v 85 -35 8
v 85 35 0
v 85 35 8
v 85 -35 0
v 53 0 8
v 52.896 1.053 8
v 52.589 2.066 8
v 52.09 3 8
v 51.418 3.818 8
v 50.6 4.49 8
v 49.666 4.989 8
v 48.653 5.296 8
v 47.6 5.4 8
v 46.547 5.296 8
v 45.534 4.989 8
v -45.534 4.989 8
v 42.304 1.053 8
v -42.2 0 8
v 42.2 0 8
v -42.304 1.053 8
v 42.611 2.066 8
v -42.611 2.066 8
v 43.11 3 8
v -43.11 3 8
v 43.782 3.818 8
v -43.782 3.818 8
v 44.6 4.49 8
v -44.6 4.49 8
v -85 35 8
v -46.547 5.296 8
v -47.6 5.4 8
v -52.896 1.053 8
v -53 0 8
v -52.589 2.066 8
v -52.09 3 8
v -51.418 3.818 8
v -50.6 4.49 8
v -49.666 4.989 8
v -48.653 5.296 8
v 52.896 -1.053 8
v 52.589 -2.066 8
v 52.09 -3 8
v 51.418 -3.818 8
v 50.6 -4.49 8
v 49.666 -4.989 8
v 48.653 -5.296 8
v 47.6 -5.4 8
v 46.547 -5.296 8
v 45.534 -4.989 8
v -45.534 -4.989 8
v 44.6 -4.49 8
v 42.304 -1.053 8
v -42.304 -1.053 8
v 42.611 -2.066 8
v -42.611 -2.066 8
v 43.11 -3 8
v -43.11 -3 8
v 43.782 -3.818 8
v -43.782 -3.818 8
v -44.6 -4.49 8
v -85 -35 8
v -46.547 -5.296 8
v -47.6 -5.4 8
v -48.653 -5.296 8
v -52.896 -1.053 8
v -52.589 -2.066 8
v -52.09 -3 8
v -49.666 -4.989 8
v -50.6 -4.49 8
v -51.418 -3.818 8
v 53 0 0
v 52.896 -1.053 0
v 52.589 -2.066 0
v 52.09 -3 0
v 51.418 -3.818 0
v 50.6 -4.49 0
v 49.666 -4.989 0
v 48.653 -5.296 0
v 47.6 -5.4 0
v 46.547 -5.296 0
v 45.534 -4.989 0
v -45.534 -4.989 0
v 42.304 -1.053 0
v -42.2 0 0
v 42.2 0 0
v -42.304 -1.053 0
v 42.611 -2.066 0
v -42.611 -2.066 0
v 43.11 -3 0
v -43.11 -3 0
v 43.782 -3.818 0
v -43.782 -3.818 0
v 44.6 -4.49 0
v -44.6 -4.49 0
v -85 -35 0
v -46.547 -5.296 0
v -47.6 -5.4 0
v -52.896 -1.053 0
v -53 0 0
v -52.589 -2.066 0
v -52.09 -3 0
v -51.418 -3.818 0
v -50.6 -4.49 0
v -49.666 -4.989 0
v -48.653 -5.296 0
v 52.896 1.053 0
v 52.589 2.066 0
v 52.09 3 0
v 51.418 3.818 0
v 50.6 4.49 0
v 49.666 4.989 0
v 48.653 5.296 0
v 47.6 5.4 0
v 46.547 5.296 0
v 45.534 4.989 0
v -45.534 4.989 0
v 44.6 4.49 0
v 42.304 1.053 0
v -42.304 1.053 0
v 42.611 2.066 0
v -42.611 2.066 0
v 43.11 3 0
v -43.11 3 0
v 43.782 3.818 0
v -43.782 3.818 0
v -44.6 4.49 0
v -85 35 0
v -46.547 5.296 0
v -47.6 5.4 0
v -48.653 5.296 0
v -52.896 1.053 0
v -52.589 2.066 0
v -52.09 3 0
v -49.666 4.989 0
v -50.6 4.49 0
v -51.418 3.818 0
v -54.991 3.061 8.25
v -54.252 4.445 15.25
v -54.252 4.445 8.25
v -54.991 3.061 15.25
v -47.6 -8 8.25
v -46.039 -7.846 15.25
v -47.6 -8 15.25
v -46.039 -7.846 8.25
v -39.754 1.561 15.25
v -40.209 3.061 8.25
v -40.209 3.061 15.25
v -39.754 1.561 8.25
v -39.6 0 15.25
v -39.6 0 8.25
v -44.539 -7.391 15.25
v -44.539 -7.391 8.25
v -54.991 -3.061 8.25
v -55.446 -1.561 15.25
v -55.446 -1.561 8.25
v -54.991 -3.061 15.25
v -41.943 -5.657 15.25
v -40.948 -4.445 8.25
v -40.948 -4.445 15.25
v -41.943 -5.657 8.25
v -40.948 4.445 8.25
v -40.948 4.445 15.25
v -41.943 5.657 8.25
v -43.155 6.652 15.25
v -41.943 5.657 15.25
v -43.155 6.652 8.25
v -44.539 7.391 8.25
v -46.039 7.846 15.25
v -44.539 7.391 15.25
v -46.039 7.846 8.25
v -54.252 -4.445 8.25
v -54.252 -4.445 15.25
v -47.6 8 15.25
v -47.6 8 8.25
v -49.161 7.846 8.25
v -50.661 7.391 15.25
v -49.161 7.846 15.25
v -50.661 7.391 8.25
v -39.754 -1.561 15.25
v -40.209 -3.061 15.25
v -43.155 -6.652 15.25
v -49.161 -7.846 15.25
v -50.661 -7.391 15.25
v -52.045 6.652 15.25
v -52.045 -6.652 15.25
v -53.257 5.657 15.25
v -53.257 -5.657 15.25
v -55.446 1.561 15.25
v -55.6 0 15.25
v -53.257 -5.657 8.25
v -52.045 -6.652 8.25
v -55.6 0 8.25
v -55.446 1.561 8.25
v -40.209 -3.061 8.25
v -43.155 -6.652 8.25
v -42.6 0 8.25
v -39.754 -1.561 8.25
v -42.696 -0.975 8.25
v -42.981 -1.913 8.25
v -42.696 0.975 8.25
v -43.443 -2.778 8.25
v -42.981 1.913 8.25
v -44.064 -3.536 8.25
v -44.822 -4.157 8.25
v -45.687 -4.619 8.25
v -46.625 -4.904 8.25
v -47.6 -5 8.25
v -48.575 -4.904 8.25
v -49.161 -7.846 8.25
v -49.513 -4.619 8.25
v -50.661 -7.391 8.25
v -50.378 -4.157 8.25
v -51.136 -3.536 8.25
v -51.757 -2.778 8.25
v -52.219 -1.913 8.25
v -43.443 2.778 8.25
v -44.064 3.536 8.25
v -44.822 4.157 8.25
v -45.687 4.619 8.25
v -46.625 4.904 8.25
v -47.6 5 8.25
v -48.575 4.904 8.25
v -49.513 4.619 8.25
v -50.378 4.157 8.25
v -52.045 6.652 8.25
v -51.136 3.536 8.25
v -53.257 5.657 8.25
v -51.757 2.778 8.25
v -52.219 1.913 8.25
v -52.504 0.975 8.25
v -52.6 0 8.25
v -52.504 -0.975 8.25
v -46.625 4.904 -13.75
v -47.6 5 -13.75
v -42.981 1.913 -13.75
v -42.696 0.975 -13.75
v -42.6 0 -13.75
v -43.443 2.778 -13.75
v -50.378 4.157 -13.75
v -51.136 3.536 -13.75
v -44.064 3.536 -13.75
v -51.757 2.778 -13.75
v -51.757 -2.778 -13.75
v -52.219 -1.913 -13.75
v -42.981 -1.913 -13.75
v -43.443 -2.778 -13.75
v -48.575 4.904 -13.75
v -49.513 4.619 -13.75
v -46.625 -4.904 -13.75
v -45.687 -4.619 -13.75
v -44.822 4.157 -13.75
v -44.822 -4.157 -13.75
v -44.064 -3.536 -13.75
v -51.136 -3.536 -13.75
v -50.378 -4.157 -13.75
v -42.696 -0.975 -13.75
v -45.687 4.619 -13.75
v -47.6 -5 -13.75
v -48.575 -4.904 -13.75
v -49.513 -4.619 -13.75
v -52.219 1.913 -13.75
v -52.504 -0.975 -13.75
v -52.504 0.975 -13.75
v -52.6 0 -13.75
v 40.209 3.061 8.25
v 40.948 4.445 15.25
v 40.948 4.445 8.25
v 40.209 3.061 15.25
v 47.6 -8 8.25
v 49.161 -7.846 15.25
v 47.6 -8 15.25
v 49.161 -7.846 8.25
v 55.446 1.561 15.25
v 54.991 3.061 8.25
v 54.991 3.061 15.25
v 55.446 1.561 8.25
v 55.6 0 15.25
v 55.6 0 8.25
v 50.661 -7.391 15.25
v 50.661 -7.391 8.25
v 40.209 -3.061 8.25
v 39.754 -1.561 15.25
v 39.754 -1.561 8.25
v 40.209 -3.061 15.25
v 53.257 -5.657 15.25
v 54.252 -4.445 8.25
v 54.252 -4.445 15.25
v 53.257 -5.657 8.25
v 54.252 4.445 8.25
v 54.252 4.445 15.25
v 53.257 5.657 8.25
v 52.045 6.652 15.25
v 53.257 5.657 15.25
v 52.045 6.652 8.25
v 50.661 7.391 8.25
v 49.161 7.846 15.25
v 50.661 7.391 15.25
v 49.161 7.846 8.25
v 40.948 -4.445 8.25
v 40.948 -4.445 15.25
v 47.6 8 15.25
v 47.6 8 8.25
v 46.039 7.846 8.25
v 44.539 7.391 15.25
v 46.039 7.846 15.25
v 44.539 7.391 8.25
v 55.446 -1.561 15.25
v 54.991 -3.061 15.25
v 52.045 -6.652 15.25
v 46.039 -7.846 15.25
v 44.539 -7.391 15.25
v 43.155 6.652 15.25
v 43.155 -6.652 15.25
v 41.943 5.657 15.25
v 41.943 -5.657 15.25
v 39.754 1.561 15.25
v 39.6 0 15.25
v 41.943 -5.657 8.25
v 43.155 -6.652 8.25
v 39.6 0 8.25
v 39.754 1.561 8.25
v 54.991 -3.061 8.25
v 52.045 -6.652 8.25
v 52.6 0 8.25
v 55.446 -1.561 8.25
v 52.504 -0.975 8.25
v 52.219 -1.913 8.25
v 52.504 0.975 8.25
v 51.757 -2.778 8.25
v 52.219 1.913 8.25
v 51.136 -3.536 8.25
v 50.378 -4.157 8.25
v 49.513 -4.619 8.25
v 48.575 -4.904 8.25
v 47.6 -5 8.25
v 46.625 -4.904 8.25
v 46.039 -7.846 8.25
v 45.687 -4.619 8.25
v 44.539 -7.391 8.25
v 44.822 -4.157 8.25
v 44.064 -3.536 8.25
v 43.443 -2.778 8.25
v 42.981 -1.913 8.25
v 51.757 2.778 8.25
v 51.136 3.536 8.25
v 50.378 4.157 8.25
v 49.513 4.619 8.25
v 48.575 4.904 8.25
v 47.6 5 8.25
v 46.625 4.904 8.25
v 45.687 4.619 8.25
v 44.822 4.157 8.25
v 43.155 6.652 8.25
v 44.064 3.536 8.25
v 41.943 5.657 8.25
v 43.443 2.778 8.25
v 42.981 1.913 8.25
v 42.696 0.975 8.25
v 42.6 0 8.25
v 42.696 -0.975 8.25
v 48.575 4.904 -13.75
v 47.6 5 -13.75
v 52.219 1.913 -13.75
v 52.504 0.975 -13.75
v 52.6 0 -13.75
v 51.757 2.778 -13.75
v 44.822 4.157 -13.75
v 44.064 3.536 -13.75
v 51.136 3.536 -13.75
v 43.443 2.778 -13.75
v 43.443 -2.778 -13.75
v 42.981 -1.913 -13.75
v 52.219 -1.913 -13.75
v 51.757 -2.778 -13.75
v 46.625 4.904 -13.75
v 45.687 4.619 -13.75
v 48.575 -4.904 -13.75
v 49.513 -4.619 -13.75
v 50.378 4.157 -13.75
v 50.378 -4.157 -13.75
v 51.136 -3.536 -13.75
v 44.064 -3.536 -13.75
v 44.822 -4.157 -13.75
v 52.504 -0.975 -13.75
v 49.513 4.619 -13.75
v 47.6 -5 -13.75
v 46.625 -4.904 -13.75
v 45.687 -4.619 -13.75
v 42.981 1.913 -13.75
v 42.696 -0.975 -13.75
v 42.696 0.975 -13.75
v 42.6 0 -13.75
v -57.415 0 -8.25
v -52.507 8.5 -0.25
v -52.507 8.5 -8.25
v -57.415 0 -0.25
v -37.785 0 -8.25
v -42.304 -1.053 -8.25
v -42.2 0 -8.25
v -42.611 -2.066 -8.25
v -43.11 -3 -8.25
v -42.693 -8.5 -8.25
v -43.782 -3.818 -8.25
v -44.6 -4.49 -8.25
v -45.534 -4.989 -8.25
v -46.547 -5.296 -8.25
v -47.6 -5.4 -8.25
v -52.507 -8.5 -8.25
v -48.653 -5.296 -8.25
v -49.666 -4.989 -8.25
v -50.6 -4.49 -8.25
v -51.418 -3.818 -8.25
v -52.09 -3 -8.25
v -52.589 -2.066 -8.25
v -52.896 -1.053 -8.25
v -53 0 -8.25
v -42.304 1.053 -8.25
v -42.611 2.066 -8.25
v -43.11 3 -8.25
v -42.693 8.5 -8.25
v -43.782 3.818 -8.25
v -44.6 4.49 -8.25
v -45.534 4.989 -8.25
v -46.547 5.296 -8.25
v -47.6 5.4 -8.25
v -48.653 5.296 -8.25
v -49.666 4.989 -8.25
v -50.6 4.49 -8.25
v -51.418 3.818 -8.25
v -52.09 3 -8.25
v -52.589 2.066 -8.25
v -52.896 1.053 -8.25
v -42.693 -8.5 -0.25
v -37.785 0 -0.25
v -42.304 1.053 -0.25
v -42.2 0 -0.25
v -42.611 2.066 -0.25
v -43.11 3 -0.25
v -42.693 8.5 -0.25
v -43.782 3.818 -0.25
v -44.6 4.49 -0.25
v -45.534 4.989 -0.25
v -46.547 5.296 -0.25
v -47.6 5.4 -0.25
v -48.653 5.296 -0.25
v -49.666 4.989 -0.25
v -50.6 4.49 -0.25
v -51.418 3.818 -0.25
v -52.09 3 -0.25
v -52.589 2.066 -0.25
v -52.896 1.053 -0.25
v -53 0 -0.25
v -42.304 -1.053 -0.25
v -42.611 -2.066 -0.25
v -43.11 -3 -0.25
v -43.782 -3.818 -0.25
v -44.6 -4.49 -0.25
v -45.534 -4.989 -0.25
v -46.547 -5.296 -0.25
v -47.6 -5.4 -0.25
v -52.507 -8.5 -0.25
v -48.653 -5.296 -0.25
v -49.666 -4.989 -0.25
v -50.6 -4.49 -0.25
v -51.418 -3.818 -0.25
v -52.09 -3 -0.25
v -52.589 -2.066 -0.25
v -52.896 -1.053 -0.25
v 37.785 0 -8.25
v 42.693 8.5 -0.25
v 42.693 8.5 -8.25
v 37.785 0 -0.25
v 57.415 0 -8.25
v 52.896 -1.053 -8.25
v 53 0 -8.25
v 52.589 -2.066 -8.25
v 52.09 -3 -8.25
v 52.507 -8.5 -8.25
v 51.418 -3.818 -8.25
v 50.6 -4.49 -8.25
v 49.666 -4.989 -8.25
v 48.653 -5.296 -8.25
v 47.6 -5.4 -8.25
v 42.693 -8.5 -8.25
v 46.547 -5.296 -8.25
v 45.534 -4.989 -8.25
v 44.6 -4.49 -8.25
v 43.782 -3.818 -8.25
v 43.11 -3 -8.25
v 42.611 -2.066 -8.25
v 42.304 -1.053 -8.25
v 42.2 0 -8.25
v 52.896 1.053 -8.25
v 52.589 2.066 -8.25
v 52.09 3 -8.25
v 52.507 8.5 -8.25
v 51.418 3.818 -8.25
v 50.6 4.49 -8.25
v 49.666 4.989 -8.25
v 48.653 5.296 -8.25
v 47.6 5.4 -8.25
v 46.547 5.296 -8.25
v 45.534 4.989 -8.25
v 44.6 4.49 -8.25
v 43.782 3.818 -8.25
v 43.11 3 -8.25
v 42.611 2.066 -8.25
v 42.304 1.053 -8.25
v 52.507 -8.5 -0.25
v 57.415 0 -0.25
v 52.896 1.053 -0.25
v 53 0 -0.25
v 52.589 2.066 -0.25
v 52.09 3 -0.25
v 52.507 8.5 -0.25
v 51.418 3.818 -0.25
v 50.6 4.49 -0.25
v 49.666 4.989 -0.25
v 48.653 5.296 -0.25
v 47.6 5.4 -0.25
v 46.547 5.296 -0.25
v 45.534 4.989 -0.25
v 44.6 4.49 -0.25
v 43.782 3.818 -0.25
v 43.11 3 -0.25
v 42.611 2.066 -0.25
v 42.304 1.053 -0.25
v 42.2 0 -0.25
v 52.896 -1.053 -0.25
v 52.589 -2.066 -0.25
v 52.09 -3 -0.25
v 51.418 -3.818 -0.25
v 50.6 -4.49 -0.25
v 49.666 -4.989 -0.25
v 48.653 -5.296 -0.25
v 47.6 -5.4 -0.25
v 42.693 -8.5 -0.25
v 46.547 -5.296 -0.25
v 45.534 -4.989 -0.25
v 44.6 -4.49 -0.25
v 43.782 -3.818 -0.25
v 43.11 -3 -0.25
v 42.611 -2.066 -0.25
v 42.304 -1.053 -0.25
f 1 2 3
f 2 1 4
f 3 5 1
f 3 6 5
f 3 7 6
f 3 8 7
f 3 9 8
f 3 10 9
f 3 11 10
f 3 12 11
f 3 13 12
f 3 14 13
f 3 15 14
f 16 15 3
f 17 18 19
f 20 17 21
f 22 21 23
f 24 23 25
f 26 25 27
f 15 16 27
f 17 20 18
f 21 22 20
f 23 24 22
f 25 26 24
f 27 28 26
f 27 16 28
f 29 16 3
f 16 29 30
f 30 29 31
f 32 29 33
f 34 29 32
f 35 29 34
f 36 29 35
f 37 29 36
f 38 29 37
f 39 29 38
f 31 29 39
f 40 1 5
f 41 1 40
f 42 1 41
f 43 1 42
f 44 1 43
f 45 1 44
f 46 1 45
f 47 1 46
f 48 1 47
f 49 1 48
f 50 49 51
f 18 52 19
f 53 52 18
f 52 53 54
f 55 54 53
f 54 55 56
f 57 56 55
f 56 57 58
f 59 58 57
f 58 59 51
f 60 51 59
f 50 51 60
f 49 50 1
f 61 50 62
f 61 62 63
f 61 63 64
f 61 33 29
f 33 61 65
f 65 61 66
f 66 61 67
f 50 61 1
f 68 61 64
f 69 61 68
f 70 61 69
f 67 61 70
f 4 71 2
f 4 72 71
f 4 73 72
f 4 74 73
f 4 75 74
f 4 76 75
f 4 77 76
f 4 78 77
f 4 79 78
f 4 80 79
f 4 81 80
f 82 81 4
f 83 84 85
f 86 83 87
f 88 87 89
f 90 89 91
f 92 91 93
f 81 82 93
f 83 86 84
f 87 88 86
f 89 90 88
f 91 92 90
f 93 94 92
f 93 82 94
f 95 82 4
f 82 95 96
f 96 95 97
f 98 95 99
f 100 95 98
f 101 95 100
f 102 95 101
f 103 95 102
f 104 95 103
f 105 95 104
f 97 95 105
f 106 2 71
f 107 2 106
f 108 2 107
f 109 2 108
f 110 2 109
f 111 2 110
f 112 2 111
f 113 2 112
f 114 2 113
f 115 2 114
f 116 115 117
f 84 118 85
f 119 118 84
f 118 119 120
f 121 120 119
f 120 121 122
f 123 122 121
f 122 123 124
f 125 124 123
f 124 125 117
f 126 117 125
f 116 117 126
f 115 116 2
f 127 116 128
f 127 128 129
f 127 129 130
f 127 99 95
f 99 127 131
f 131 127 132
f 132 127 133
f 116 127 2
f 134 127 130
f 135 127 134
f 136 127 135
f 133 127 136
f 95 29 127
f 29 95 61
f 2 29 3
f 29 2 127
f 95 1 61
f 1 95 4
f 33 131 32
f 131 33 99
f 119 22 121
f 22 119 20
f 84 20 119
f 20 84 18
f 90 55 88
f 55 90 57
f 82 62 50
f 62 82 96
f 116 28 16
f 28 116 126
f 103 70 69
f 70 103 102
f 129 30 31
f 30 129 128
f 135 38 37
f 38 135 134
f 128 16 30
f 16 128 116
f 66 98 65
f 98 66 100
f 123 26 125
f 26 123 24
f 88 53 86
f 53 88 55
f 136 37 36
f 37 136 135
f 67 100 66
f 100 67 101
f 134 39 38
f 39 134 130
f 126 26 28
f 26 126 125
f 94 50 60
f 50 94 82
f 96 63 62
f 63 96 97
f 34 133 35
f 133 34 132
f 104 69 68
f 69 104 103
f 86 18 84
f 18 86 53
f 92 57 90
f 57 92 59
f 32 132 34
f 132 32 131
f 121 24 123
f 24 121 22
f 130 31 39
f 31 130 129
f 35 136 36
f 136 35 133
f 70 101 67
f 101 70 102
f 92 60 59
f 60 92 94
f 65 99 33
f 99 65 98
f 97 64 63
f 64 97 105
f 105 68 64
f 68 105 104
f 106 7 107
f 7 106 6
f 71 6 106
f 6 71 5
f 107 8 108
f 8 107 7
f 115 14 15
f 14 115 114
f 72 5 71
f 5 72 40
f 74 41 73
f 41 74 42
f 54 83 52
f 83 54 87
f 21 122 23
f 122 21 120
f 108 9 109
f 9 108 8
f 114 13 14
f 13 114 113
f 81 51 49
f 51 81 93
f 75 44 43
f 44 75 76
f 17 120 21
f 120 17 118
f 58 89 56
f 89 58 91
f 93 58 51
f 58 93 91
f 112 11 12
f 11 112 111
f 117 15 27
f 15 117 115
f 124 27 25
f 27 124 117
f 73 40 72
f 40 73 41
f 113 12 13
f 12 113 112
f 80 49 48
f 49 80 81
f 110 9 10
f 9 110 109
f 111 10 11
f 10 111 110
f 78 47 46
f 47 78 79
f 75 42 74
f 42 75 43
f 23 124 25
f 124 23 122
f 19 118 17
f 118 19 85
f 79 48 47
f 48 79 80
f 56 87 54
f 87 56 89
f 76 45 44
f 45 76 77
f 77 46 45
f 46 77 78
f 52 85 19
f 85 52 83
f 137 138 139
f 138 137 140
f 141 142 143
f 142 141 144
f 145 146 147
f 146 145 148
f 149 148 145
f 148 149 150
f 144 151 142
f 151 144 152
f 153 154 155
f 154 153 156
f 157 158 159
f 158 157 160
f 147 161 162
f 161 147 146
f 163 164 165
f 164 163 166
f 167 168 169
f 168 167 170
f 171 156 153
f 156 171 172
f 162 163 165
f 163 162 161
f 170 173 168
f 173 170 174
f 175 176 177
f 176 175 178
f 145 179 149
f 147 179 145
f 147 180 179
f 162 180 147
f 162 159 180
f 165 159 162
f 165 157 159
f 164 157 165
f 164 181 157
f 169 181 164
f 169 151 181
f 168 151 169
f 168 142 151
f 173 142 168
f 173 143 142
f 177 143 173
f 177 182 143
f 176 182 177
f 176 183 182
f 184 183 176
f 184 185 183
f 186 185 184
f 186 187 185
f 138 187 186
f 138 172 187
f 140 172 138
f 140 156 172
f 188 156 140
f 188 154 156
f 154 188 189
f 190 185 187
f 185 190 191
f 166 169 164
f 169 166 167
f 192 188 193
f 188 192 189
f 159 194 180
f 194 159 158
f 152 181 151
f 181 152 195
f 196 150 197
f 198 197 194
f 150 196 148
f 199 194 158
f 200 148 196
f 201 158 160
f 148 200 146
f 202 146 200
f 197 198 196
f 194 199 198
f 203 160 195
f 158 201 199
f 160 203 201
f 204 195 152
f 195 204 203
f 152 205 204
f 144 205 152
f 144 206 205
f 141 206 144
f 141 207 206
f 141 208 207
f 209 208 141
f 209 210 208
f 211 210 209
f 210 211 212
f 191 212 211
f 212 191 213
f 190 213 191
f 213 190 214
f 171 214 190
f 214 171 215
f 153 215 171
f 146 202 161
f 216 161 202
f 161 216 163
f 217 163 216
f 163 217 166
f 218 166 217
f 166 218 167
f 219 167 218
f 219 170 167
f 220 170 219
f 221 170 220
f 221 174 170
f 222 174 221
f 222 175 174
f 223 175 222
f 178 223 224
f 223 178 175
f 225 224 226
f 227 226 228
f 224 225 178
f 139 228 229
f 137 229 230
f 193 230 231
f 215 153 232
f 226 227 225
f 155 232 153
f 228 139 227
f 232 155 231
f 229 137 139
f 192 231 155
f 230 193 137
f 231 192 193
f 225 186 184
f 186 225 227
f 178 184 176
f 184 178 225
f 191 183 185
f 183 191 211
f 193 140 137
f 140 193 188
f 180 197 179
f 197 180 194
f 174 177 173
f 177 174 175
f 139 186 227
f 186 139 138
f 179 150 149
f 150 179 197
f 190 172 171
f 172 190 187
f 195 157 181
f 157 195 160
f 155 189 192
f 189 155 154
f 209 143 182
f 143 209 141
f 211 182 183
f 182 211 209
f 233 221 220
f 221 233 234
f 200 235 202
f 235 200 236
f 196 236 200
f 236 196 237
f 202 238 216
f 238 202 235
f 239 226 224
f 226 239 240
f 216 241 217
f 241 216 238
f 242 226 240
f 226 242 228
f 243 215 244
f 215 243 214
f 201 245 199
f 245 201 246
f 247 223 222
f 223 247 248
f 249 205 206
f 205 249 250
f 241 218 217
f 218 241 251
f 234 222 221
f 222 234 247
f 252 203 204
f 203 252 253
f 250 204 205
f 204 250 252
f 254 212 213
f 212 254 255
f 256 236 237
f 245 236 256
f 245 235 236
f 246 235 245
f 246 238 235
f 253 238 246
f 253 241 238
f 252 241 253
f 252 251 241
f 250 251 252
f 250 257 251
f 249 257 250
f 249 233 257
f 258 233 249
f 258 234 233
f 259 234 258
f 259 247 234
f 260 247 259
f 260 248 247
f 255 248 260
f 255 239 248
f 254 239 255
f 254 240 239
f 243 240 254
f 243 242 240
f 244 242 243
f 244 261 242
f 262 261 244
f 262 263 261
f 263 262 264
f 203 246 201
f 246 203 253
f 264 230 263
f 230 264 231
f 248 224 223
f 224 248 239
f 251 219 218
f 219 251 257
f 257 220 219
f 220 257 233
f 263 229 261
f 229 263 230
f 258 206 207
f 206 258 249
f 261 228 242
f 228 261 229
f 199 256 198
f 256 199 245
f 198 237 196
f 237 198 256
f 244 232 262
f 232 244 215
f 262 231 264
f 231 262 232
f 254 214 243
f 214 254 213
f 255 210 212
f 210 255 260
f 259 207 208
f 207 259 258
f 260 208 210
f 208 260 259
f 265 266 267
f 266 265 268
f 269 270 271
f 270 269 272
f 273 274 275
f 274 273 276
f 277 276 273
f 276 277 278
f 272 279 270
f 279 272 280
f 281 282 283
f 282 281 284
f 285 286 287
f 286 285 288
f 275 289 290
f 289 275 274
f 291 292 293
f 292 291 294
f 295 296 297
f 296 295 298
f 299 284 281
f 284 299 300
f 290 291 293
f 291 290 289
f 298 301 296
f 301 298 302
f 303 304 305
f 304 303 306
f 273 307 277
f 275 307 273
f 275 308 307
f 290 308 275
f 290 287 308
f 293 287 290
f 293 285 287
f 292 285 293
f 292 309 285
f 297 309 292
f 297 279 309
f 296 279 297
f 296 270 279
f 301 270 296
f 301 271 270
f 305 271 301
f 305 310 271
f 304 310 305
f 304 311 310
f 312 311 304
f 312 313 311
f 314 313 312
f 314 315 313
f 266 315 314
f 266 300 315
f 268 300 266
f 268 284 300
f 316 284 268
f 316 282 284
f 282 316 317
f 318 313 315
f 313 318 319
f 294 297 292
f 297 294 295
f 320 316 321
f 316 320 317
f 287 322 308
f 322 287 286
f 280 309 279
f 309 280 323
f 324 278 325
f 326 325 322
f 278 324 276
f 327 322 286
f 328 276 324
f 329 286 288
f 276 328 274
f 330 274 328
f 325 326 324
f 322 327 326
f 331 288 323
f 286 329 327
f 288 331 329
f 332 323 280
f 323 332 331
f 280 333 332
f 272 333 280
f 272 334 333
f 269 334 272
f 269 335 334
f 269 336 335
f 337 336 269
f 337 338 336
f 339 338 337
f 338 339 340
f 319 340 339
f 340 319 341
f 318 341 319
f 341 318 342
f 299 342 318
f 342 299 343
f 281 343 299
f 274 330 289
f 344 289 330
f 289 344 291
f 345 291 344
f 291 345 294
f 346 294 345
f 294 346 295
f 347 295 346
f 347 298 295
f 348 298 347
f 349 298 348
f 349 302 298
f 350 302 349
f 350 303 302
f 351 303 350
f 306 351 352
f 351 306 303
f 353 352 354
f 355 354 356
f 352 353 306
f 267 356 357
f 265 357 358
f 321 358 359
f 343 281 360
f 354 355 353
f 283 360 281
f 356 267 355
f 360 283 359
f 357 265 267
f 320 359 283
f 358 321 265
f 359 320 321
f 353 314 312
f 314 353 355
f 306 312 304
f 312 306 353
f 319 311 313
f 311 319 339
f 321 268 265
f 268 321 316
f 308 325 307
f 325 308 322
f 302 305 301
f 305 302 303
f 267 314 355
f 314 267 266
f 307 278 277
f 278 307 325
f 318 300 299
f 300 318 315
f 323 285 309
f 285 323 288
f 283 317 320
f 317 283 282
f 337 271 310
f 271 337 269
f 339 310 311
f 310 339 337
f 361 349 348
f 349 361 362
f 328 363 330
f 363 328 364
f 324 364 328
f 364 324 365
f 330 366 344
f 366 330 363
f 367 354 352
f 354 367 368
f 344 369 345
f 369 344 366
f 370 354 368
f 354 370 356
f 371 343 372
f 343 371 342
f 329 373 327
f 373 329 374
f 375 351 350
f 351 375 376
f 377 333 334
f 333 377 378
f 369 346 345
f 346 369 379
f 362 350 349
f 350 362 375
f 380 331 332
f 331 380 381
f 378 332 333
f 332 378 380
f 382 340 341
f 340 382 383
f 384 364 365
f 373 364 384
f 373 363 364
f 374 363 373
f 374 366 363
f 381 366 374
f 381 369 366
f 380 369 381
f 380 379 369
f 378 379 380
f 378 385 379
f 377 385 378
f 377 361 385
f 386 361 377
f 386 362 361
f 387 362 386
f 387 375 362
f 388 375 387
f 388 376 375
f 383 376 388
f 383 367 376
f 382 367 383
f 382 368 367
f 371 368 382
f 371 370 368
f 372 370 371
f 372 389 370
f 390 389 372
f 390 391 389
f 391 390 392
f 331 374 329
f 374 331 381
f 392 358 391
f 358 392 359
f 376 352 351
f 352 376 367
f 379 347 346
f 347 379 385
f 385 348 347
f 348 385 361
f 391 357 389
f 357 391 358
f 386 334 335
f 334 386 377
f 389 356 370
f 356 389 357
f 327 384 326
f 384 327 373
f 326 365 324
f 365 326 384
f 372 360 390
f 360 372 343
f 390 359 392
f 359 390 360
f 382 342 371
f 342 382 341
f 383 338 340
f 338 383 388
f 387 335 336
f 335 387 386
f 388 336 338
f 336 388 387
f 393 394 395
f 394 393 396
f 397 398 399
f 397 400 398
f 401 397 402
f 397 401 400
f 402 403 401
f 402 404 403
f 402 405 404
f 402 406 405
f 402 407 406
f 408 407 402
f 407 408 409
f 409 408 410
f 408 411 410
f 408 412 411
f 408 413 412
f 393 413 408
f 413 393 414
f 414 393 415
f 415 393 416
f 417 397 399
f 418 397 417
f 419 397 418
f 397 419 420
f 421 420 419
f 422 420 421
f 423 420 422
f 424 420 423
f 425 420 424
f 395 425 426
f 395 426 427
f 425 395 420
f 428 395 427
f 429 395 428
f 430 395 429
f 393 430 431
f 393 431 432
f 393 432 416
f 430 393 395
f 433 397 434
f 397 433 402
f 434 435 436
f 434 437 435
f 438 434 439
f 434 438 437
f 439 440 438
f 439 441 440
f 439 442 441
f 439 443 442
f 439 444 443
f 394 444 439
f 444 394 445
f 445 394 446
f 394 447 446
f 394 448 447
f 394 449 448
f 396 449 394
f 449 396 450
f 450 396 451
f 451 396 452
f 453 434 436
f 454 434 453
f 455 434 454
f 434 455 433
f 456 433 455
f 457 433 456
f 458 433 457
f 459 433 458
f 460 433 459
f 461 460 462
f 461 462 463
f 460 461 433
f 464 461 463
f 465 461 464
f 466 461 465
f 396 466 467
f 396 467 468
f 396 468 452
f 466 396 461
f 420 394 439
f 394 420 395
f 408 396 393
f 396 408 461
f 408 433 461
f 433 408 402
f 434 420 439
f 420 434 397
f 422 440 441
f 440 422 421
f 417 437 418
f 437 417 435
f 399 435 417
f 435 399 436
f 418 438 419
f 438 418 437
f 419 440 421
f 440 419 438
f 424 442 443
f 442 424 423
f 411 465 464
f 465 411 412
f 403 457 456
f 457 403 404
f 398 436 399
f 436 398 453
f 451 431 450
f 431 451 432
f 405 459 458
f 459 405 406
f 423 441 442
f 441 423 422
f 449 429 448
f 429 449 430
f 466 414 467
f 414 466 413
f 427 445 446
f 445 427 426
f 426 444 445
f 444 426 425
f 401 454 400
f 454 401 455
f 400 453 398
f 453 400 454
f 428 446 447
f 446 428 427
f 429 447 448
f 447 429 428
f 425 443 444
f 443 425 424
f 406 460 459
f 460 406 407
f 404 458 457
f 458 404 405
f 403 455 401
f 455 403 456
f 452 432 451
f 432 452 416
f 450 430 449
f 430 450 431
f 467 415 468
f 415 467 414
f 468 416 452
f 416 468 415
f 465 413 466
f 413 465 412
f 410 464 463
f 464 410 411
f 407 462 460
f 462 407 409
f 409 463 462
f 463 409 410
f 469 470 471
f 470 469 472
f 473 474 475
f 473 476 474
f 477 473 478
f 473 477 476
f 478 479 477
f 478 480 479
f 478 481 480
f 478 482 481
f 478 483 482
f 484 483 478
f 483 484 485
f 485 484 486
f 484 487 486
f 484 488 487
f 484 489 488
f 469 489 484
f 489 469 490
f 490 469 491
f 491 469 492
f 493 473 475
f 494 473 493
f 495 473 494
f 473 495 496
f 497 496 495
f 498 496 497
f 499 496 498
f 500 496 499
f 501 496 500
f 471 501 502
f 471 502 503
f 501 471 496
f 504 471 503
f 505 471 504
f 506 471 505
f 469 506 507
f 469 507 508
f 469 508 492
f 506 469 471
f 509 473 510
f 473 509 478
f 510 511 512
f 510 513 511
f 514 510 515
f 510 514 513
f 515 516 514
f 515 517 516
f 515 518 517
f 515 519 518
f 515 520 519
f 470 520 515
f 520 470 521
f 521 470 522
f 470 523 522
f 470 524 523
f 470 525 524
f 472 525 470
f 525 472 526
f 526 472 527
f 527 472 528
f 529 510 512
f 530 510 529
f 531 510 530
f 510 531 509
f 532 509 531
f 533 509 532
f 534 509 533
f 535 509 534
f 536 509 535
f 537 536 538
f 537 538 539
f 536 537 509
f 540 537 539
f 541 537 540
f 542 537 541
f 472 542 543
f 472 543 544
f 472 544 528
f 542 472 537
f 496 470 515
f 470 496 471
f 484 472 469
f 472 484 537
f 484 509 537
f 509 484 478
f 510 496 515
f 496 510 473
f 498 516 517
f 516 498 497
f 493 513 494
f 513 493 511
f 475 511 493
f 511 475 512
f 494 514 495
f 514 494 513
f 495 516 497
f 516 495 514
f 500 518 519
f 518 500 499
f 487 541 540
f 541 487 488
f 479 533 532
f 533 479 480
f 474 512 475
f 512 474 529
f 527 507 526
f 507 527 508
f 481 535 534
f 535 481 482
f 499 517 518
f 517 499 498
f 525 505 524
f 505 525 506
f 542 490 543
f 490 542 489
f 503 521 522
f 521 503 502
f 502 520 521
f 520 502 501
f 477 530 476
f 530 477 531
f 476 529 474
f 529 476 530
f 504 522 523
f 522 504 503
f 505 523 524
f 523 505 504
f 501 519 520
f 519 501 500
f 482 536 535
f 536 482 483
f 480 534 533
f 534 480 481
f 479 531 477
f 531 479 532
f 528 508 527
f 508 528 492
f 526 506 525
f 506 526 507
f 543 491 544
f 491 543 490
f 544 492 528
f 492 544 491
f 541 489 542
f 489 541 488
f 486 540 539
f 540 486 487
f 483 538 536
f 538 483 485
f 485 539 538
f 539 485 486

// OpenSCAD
$fn = 32;

// ------------------------------------------------------------------------
// Bolted plate: 170 x 70 x 8 mm plate, 2 fasteners
// Every part is its own module, assembly() places them once.
// ------------------------------------------------------------------------

// --- part 1 ---
module plate() {
  difference() {
    translate([-85, -35, 0]) cube([170, 70, 8]);
    translate([-47.6, 0, -1]) cylinder(h = 10, d = 10.8);
    translate([47.6, 0, -1]) cylinder(h = 10, d = 10.8);
  }
}

// --- part 2 ---
module bolt1() {
  cylinder(h = 7, d = 16);
  translate([0, 0, -22]) cylinder(h = 22, d = 10);
}

// --- part 3 ---
module bolt2() {
  cylinder(h = 7, d = 16);
  translate([0, 0, -22]) cylinder(h = 22, d = 10);
}

// --- part 4 ---
module nut1() {
  difference() {
    linear_extrude(height = 8) polygon(points = [[9.815, 0], [4.907, 8.5], [-4.907, 8.5], [-9.815, 0], [-4.907, -8.5], [4.907, -8.5]]);
    translate([0, 0, -1]) cylinder(h = 10, d = 10.8);
  }
}

// --- part 5 ---
module nut2() {
  difference() {
    linear_extrude(height = 8) polygon(points = [[9.815, 0], [4.907, 8.5], [-4.907, 8.5], [-9.815, 0], [-4.907, -8.5], [4.907, -8.5]]);
    translate([0, 0, -1]) cylinder(h = 10, d = 10.8);
  }
}

// --- assembly ---
module assembly() {
  translate([0, 0, 0]) rotate([0, 0, 0]) plate();
  translate([-47.6, 0, 8.25]) rotate([0, 0, 0]) bolt1();
  translate([47.6, 0, 8.25]) rotate([0, 0, 0]) bolt2();
  translate([-47.6, 0, -8.25]) rotate([0, 0, 0]) nut1();
  translate([47.6, 0, -8.25]) rotate([0, 0, 0]) nut2();
}

assembly();
